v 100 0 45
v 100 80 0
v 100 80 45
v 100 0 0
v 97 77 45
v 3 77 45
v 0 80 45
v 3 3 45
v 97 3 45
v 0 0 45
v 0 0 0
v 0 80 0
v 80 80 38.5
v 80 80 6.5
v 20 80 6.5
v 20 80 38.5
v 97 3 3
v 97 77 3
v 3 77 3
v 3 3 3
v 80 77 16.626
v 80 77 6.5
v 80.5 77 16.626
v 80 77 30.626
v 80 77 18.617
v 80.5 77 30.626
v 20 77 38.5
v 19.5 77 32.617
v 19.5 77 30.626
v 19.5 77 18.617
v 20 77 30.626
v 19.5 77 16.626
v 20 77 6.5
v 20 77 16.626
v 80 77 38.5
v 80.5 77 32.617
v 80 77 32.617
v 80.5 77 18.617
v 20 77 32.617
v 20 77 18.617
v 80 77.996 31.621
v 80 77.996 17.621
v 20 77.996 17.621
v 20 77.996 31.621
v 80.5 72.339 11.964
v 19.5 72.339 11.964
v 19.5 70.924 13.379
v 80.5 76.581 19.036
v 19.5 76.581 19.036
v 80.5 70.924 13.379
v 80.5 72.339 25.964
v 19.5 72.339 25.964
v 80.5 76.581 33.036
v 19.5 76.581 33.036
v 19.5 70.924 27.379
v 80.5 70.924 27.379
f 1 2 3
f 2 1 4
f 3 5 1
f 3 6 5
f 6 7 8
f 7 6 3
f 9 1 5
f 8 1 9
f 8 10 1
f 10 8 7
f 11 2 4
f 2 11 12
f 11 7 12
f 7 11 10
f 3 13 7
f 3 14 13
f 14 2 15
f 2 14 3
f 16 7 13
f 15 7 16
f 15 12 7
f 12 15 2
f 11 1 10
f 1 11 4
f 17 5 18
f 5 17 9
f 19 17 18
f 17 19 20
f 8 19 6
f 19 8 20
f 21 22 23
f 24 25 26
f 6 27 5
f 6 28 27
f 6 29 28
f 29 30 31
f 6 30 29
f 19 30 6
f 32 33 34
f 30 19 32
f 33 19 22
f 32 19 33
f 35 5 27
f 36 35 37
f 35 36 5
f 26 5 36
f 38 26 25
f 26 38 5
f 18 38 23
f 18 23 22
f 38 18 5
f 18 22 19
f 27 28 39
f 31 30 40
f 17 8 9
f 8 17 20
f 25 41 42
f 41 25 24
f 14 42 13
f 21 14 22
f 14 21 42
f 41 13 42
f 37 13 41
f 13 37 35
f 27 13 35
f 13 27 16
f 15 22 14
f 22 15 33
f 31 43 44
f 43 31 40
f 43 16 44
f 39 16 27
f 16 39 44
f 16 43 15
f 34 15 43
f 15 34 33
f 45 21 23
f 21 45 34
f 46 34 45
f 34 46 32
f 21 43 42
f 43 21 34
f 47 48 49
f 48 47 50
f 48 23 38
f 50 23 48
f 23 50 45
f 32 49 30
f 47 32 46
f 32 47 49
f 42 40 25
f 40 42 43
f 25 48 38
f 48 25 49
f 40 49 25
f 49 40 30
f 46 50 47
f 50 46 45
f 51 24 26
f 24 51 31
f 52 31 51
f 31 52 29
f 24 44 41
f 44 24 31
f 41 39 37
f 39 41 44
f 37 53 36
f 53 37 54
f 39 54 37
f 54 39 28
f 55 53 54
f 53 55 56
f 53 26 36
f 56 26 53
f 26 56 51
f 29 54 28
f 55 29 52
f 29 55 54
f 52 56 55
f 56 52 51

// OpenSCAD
$fn = 32;

// ----------------------------------------------------------------------
// Vent box: louvers enclosure
// ----------------------------------------------------------------------

// --- parameters (mm) ---
box_l = 100;              // box length, X
box_w = 80;               // box width, Y
box_h = 45;               // box height, Z
wall_t = 3;               // shell wall thickness
win_l = 60;               // vent window width, X
win_h = 32;               // vent window height, Z
slat_t = 2;               // louver slat thickness
slat_d = 8;               // louver slat depth
slat_a = 45;              // louver slat angle, degrees
slat_pitch = 14;          // louver pitch
slat_yc = 74.46;          // slat centreline Y

win_z0 = (box_h - win_h) / 2;  // window lower edge Z
n_slats = 2;  // louver count
slat_z0 = win_z0 + (win_h - (n_slats - 1) * slat_pitch) / 2;

difference() {
  union() {
    difference() {
      cube([box_l, box_w, box_h]);
  translate([wall_t, wall_t, wall_t])
    cube([box_l - 2 * wall_t, box_w - 2 * wall_t, box_h]);
  translate([(box_l - win_l) / 2, box_w - wall_t - 1, win_z0])
    cube([win_l, wall_t + 2, win_h]);
    }
    for (i = [0 : n_slats - 1])
      translate([box_l / 2, slat_yc, slat_z0 + i * slat_pitch])
        rotate([slat_a, 0, 0])
          cube([win_l + 1, slat_d, slat_t], center = true);
  }
}
